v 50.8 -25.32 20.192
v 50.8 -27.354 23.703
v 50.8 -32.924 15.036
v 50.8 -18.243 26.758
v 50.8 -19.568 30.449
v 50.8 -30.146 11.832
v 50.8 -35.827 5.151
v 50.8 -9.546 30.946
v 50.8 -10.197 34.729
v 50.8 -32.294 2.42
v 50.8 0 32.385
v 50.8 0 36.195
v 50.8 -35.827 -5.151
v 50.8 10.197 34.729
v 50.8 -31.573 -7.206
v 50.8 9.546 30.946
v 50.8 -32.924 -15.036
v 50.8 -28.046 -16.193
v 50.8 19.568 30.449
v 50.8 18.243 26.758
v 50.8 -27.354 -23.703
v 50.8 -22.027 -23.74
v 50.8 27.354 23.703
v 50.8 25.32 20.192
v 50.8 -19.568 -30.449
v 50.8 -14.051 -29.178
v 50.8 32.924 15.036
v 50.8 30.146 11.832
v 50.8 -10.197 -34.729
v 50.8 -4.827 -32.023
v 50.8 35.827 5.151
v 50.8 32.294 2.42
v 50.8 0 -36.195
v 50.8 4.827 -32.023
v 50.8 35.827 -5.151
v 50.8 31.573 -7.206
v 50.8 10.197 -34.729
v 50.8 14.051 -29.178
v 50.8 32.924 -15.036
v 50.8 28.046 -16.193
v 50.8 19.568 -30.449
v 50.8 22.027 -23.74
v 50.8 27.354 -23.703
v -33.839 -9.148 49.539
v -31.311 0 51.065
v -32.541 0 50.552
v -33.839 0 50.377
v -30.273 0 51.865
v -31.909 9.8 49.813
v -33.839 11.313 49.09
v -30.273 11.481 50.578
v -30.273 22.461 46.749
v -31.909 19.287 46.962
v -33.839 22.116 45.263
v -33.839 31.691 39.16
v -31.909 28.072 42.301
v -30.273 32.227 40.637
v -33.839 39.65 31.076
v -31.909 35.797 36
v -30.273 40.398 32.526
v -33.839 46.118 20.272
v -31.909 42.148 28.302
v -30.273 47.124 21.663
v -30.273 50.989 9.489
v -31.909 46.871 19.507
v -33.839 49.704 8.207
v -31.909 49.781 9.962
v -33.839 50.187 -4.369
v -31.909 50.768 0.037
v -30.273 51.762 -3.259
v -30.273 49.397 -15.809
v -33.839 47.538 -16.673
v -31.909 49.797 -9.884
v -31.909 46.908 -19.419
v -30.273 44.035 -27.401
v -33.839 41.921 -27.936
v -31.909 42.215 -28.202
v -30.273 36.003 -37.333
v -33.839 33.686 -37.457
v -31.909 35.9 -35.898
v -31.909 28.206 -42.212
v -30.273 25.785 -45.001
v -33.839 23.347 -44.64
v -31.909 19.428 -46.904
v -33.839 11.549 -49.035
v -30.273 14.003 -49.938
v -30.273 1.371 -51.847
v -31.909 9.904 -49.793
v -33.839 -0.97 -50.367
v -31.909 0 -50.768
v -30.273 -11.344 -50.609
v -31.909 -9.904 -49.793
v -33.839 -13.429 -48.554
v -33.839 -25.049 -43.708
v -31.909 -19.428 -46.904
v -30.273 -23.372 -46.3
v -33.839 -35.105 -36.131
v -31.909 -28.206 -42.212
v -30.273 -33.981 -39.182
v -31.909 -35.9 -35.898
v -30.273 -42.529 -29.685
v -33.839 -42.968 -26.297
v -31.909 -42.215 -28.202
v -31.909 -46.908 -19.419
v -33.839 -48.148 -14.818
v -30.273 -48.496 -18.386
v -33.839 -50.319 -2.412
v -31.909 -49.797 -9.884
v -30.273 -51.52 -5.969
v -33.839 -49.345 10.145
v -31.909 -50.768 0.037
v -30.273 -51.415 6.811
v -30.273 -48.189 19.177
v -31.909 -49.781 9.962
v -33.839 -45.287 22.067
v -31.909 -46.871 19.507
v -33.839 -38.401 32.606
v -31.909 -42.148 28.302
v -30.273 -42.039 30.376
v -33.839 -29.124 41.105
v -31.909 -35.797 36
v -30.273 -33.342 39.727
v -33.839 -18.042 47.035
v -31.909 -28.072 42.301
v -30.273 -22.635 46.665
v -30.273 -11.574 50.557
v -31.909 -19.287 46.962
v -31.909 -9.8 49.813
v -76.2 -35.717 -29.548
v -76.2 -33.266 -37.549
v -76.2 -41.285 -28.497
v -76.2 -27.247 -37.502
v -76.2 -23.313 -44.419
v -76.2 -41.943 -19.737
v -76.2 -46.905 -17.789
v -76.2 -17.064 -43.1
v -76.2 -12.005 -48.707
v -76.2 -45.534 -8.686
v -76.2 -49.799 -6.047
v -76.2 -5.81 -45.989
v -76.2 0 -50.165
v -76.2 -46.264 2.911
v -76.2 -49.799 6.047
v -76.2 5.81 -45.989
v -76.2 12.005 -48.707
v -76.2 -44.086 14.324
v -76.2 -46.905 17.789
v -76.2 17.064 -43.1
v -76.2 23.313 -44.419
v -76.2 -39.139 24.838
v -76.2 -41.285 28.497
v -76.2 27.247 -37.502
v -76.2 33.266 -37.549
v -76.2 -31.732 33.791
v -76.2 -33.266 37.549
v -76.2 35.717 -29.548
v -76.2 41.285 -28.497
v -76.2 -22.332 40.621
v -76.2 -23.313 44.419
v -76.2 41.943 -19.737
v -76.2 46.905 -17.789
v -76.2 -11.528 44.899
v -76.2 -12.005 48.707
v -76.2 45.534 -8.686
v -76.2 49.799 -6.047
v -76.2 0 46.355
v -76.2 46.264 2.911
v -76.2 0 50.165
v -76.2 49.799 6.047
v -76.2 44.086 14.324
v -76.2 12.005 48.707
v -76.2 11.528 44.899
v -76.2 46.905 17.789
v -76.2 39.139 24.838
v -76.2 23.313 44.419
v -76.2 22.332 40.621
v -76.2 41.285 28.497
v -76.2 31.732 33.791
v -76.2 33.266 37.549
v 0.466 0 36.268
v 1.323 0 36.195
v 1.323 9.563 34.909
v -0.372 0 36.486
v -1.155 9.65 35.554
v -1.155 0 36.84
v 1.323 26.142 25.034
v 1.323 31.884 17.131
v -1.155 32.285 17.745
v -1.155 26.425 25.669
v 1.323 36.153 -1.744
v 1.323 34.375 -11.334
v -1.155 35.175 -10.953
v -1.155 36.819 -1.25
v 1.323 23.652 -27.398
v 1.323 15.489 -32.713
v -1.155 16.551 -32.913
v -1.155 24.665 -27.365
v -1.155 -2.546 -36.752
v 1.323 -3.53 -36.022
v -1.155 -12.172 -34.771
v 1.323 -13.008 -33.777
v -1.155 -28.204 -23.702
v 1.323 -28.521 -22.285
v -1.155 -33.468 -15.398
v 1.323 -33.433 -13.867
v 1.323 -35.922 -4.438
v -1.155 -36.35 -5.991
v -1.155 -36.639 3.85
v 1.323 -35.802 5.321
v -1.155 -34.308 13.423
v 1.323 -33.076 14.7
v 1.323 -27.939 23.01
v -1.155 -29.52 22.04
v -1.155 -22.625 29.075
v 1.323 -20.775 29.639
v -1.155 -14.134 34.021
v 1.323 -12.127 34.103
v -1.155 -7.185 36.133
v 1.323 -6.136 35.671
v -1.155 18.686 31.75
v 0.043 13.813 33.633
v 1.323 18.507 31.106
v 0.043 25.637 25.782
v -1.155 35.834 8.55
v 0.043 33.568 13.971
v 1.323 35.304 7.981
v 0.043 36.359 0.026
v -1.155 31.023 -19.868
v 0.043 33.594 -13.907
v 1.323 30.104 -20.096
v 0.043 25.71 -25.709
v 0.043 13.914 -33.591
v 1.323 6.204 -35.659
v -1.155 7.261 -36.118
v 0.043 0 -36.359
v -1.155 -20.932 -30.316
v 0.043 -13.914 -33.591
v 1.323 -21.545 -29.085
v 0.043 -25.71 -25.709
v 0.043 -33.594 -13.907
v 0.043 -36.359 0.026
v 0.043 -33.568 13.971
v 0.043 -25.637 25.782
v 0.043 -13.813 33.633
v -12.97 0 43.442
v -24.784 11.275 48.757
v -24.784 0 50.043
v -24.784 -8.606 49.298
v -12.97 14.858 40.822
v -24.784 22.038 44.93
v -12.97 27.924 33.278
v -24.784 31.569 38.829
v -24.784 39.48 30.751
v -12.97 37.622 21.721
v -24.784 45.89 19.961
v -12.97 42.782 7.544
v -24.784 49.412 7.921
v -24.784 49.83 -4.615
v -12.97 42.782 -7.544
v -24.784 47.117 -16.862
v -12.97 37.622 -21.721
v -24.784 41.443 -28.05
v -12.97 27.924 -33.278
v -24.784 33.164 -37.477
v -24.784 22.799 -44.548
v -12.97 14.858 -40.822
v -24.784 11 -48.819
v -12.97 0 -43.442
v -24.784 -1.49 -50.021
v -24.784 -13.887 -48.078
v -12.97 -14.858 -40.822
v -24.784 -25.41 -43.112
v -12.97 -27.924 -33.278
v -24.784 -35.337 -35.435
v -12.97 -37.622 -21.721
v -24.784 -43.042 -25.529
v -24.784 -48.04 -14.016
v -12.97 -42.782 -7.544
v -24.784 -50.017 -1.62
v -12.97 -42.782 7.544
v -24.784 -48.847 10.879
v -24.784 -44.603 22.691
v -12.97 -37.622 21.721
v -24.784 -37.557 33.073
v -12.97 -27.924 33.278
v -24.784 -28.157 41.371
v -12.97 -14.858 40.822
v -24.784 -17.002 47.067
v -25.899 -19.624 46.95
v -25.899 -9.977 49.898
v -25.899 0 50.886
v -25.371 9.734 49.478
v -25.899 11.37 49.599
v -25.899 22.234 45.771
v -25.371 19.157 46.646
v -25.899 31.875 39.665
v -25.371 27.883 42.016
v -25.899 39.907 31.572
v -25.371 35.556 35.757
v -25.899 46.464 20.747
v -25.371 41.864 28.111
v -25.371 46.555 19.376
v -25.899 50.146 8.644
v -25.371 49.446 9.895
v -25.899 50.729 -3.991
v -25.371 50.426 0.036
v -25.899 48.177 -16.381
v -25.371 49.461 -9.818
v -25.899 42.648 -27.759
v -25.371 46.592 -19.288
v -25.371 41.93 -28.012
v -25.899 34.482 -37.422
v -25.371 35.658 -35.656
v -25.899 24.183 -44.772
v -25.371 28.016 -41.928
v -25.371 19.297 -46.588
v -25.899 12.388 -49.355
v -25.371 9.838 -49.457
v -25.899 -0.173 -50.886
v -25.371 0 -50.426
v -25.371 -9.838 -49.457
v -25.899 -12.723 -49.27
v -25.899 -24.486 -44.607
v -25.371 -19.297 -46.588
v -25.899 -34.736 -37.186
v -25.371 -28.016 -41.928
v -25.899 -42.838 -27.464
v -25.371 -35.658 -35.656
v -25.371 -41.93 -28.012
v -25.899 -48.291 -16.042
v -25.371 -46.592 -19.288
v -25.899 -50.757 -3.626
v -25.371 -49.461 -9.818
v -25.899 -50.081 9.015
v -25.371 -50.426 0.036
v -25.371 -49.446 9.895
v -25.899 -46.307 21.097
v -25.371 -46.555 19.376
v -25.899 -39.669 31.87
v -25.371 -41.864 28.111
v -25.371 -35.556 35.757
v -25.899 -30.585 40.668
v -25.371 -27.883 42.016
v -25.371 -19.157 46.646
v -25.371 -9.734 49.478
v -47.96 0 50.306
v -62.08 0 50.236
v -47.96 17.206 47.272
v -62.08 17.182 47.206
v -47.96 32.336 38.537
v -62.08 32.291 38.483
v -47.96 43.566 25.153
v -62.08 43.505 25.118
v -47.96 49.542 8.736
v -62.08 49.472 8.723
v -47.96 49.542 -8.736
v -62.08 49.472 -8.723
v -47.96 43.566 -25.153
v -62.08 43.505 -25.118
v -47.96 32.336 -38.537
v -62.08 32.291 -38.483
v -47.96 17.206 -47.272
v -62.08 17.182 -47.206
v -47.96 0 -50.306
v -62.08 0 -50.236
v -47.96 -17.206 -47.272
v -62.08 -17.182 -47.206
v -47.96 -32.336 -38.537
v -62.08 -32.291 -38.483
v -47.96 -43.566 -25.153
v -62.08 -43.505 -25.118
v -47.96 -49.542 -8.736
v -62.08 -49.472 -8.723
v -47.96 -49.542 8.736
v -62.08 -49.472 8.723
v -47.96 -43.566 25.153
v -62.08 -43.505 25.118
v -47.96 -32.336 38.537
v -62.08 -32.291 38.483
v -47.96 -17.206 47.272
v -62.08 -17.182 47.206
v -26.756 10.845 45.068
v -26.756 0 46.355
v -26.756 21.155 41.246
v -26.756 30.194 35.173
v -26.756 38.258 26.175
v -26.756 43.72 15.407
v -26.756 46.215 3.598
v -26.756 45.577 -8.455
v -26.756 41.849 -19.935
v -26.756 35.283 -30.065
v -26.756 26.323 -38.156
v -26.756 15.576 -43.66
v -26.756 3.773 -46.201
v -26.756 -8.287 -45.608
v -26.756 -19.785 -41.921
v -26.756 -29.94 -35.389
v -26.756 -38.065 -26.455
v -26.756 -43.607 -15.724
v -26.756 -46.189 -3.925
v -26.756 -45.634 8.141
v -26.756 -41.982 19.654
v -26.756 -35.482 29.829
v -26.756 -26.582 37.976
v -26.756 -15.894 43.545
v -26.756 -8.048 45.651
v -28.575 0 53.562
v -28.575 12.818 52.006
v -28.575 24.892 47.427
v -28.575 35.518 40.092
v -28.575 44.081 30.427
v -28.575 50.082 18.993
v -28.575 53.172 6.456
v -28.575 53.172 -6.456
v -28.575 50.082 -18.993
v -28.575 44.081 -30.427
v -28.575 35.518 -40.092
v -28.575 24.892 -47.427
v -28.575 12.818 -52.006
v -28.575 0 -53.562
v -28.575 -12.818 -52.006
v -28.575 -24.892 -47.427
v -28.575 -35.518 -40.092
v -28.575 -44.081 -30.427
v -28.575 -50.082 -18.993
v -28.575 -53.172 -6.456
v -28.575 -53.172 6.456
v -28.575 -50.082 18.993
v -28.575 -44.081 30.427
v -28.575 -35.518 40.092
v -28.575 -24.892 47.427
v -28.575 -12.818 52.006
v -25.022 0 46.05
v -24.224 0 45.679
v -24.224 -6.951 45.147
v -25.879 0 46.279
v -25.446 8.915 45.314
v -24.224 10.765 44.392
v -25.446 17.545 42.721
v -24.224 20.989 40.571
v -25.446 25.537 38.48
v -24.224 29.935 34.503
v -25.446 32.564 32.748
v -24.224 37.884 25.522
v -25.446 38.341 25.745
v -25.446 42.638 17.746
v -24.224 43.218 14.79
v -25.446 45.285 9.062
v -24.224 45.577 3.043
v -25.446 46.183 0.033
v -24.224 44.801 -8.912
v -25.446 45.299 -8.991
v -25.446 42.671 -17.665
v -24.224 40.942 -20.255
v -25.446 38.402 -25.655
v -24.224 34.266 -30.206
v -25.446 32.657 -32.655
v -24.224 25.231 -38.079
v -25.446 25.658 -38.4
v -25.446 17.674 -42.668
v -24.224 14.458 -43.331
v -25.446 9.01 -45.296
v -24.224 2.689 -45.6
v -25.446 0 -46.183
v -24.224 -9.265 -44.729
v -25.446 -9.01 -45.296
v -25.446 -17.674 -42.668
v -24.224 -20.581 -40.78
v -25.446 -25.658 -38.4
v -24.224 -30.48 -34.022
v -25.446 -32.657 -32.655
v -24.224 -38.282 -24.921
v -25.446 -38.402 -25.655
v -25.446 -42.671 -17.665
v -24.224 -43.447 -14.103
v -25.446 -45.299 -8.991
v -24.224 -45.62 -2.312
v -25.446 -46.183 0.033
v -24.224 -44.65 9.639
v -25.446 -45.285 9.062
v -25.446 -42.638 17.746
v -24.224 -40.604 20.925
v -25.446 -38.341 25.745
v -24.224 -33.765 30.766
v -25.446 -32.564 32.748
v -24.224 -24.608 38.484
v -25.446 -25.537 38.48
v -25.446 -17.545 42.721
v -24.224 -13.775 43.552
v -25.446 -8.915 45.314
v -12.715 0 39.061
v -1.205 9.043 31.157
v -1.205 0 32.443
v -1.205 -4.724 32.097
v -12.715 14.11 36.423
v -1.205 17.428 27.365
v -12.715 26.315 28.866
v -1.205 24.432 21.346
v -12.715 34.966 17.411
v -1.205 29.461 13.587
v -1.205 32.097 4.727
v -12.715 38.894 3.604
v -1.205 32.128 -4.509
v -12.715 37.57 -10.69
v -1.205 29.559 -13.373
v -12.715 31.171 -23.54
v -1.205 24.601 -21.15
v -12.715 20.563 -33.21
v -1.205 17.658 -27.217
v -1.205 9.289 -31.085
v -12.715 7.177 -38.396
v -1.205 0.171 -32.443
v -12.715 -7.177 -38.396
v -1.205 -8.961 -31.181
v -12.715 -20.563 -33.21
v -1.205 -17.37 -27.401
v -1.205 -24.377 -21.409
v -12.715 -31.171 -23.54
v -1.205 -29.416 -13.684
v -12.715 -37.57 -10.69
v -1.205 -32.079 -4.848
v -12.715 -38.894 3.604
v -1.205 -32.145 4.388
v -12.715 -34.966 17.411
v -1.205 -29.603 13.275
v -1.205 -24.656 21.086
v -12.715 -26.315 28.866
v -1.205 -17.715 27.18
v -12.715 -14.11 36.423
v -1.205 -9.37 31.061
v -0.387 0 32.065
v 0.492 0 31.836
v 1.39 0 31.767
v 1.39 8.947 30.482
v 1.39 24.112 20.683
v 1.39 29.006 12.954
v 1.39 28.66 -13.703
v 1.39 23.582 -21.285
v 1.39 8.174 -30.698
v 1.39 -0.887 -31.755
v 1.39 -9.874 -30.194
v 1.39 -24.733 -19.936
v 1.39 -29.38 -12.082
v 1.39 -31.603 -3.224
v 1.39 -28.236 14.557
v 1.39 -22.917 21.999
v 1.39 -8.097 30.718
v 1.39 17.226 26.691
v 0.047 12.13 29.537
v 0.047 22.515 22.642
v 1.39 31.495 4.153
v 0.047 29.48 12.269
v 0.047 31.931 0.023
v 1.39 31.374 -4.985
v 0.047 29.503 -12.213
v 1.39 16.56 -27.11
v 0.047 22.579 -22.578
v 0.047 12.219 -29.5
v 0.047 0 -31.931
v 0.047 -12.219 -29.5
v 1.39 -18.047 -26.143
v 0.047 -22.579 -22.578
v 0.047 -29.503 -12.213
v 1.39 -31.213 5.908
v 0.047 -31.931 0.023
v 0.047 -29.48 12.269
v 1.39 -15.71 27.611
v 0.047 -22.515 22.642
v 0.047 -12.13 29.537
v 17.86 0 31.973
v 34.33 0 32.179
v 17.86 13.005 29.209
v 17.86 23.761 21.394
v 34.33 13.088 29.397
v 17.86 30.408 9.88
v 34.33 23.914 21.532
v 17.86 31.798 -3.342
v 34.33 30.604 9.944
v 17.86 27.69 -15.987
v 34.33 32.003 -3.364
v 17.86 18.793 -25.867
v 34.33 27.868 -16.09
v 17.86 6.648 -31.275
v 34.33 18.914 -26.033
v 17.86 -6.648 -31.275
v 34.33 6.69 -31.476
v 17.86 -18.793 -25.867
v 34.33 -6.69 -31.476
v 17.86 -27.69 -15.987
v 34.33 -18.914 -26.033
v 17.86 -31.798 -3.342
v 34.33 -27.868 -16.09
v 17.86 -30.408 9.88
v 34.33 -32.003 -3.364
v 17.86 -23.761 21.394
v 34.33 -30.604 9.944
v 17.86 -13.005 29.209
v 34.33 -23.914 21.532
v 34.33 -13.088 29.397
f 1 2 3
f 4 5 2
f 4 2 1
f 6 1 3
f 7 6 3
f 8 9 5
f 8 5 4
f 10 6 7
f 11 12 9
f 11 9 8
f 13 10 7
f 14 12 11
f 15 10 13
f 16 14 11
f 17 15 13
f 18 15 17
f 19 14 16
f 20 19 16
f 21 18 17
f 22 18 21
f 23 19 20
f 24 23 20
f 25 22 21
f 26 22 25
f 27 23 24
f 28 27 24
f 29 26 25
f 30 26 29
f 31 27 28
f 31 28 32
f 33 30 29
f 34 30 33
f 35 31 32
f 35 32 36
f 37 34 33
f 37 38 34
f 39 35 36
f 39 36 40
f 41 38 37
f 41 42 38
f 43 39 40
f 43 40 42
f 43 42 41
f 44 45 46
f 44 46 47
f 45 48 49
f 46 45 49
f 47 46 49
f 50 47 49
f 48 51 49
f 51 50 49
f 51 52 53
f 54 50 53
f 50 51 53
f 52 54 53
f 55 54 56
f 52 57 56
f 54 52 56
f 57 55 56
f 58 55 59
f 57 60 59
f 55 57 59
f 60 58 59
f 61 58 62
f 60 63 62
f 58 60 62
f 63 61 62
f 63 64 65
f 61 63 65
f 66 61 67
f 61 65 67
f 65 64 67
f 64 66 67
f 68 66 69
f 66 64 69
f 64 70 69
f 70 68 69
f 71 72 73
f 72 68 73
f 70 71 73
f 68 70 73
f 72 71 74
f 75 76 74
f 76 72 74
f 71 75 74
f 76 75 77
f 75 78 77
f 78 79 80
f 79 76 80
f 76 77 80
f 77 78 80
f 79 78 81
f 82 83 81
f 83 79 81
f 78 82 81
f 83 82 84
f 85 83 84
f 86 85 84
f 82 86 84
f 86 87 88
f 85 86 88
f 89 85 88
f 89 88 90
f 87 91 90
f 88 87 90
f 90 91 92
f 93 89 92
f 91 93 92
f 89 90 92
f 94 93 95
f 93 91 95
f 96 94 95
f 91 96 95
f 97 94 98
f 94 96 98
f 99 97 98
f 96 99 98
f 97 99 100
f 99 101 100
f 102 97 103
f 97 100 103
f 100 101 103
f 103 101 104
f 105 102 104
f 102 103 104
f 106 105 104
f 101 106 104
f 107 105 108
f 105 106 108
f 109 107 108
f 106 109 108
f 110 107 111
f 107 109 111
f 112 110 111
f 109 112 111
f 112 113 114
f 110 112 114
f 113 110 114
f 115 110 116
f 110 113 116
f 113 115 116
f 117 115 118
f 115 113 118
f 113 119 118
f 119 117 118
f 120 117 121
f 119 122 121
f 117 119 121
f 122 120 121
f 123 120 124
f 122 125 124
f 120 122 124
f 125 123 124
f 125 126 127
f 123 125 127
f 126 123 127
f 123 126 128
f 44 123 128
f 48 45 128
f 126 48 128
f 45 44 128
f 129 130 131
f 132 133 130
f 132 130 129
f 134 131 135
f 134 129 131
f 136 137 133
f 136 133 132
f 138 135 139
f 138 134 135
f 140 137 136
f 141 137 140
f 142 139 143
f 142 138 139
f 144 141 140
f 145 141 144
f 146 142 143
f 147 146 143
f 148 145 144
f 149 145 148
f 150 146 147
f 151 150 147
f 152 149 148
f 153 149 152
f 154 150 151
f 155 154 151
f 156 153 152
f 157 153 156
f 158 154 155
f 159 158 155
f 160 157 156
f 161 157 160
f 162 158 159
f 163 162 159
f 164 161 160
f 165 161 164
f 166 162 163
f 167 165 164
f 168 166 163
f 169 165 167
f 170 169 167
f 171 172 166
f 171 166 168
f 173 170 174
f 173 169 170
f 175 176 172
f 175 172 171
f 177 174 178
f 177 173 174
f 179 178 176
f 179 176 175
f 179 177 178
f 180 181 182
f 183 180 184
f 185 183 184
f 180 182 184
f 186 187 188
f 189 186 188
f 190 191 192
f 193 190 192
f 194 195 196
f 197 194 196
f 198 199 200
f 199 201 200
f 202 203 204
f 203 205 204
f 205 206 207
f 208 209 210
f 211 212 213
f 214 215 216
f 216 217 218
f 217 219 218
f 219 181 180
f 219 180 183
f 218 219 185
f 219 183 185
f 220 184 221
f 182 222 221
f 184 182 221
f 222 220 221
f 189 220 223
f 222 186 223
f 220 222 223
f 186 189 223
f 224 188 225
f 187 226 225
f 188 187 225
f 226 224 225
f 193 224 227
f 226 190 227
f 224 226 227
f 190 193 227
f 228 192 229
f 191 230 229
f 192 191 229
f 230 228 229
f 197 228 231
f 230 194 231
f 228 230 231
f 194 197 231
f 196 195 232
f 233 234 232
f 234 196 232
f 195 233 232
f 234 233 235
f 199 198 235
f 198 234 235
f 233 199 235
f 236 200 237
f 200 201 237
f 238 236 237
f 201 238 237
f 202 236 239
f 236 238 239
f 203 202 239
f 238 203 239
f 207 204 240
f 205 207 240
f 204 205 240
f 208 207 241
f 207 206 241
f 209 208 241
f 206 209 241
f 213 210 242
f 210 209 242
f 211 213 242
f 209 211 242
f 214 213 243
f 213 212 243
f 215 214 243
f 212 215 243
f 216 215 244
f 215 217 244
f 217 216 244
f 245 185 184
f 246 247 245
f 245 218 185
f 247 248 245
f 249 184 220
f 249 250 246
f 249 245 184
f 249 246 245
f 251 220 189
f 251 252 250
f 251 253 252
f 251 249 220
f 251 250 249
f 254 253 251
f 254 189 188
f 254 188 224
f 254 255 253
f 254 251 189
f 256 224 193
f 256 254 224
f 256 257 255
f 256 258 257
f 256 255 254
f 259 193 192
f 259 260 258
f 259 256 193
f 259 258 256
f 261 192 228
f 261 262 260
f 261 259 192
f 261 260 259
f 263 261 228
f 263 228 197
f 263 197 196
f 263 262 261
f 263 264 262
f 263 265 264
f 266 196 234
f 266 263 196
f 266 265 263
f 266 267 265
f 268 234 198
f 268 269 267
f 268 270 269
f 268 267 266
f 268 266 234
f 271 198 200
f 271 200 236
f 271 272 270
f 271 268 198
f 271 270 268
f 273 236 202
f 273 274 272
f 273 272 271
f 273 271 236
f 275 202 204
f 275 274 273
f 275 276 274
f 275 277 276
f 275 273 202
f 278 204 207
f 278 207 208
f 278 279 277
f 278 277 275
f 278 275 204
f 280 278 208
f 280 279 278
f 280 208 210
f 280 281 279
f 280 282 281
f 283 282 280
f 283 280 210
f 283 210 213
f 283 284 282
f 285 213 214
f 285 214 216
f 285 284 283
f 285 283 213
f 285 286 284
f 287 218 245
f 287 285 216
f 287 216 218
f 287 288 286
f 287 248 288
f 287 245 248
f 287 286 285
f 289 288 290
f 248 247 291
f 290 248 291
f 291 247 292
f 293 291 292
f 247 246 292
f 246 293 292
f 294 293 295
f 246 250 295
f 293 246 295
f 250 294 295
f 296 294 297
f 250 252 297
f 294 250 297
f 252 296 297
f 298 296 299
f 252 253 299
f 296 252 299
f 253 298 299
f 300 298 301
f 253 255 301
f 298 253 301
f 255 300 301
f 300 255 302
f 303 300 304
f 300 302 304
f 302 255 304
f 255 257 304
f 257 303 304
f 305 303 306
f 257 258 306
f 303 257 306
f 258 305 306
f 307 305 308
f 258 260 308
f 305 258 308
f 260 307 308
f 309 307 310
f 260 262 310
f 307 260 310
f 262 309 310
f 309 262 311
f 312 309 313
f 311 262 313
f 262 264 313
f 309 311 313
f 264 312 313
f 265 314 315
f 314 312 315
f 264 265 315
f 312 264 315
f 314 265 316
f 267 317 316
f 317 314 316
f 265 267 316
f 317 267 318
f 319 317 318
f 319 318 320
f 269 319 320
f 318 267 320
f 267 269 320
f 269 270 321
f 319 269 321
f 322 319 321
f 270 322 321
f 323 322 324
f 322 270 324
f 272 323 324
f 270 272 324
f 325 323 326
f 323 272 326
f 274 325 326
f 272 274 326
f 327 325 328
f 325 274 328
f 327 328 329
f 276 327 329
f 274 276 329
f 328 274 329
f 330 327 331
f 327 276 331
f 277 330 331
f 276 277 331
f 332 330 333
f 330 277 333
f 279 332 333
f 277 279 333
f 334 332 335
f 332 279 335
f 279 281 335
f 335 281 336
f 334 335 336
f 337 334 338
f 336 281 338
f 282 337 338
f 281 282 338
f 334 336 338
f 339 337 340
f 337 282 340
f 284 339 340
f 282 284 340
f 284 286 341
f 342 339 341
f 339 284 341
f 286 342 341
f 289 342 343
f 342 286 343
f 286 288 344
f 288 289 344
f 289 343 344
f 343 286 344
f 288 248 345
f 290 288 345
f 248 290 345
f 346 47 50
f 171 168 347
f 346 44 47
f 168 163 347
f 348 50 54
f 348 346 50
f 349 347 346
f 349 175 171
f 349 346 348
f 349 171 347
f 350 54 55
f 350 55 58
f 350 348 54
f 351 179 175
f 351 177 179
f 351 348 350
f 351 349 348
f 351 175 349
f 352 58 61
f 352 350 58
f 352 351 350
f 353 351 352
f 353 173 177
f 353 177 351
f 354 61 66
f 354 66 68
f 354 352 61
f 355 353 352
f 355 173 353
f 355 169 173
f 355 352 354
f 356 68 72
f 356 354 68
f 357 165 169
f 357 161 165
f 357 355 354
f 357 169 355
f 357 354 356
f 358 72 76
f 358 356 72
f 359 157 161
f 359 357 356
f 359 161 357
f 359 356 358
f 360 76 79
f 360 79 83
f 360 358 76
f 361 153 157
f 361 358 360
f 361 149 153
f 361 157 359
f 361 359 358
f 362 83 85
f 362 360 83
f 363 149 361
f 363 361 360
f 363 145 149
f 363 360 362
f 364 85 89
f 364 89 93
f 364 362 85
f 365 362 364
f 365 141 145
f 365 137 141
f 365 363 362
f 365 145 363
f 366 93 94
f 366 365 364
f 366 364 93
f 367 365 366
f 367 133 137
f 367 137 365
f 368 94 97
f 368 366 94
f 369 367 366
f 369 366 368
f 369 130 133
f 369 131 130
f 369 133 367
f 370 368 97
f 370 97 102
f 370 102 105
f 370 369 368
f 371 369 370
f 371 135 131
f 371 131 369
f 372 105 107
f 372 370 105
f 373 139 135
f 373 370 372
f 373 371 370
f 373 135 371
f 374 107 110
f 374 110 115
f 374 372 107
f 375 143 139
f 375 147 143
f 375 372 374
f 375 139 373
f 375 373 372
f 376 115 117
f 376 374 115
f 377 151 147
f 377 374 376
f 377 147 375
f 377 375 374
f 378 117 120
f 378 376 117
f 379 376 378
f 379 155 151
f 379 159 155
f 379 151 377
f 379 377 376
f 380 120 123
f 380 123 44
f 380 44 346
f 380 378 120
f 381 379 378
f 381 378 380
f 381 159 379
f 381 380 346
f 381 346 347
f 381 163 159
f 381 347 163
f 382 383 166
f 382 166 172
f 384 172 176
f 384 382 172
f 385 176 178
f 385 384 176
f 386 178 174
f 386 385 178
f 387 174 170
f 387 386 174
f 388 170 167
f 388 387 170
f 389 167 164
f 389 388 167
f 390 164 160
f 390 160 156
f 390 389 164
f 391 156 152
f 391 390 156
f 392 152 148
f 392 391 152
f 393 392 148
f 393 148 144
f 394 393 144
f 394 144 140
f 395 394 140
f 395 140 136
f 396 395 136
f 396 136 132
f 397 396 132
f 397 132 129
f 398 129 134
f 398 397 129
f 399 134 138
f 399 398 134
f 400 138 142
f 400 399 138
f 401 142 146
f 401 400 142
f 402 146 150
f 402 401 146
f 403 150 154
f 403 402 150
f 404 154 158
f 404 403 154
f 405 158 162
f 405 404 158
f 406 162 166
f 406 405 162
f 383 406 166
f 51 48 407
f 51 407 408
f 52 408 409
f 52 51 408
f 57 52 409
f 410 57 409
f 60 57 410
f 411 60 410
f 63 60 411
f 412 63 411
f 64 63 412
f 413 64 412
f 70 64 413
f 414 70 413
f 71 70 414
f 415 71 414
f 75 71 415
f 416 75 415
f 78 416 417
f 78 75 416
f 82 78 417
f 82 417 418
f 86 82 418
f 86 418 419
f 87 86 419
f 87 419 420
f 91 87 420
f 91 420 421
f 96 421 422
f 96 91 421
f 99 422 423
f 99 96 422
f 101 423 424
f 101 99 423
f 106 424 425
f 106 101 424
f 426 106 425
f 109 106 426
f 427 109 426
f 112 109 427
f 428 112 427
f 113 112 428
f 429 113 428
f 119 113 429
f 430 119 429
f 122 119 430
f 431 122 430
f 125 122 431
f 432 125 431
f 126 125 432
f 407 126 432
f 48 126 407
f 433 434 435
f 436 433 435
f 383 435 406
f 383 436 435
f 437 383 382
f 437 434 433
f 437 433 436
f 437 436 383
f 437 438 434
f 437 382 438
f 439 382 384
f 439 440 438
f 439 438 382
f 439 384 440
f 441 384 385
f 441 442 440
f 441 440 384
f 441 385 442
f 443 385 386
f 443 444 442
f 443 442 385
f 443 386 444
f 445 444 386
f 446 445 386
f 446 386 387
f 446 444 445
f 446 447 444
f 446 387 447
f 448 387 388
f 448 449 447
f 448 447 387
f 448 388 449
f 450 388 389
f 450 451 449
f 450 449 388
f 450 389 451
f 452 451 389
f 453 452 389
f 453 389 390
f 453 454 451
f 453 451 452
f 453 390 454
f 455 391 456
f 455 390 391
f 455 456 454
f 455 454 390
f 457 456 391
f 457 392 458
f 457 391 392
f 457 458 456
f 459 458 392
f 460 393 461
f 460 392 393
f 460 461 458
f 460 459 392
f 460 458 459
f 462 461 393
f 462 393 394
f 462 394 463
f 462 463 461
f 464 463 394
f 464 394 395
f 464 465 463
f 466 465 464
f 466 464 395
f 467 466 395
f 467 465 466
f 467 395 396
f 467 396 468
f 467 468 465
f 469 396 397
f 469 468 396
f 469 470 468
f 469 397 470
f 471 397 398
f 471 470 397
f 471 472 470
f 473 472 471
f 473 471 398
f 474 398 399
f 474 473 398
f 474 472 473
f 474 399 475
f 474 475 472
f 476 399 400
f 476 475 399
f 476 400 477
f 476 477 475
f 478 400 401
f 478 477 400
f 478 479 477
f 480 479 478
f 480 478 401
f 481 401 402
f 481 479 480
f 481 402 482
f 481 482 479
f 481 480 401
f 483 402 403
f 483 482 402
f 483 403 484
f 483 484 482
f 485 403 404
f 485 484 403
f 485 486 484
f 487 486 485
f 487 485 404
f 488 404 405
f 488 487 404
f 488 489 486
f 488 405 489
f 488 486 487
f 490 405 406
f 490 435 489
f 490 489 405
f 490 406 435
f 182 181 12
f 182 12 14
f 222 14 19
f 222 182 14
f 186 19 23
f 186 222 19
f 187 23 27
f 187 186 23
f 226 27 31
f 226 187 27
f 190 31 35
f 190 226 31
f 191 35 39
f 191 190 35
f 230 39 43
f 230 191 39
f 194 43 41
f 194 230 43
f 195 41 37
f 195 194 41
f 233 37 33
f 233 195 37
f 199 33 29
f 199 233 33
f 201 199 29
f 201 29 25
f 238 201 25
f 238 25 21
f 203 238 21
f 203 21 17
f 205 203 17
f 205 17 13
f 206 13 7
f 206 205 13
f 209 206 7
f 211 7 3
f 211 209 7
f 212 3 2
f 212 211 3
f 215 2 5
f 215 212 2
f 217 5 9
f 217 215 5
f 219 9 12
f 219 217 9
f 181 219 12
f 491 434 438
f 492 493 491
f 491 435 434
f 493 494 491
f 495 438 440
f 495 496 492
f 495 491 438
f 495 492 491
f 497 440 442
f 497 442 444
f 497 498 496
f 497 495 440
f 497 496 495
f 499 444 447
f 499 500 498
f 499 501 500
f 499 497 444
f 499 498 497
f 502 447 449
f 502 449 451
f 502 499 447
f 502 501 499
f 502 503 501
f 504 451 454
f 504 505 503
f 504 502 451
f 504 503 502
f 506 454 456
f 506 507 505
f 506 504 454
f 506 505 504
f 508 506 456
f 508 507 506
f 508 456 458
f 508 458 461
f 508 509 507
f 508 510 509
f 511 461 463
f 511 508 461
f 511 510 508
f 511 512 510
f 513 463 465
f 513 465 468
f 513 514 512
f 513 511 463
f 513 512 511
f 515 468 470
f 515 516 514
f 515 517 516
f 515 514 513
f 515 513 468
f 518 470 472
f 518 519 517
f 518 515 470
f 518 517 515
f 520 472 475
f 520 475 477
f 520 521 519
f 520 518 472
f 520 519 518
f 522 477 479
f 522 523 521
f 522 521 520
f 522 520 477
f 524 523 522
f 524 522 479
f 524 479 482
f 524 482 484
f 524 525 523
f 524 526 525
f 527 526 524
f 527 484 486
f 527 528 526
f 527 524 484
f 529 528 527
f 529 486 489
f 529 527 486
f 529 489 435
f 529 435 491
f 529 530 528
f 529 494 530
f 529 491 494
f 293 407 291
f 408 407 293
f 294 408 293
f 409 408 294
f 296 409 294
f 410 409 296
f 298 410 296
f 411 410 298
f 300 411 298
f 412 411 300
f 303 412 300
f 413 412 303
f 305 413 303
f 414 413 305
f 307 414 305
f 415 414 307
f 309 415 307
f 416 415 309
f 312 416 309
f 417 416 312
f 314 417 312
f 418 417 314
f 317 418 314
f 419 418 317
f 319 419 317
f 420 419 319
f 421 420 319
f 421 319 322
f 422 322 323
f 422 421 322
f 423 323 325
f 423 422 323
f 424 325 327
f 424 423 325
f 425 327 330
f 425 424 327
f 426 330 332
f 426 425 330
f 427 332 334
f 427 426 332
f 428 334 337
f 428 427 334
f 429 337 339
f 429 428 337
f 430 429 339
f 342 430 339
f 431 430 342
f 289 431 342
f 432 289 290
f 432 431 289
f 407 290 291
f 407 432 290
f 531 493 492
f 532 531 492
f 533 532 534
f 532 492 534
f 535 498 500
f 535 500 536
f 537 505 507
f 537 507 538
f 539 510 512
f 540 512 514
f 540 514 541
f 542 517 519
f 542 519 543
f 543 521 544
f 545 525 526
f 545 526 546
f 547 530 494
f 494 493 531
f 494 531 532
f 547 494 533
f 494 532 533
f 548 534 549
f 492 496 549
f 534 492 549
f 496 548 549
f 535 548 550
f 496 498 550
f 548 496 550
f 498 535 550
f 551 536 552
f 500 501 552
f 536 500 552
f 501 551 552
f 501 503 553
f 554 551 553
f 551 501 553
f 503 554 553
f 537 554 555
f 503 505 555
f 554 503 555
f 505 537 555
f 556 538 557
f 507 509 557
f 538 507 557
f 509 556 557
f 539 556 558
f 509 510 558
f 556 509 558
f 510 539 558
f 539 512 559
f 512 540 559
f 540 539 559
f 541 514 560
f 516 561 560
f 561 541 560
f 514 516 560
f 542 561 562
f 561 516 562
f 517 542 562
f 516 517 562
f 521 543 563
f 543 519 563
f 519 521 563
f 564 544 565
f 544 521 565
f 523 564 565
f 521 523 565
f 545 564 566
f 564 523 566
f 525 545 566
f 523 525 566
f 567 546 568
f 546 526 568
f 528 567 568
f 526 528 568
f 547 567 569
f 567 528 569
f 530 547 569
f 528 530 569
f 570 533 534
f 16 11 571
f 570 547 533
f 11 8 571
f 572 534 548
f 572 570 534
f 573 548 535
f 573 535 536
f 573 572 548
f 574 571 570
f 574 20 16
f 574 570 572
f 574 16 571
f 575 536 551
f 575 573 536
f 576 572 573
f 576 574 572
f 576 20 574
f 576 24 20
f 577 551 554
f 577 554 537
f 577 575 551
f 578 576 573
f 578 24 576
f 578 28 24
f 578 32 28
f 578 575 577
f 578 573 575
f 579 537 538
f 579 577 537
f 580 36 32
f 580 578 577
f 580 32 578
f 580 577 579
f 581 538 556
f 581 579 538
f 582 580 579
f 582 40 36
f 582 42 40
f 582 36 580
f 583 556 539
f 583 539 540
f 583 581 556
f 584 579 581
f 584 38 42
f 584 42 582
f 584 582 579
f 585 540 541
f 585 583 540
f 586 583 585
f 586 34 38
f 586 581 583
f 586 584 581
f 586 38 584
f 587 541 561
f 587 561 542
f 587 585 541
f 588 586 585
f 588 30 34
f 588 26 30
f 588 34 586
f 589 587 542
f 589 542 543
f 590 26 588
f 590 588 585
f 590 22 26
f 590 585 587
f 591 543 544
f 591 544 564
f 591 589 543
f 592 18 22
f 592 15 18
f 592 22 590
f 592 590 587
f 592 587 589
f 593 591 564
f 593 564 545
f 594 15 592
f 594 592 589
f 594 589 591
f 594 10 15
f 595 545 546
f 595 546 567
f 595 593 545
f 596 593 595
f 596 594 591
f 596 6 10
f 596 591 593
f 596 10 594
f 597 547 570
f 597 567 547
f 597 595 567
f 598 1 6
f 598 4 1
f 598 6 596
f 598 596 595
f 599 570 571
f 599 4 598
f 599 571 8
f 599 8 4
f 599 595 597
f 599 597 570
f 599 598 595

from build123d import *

# Parameters (mm, degrees)
F3_R = 5.08


# Not quite as in the source:
# - a variable given as a bare number and used for a length is read in inches; the dataset says mm whatever the document's units were


with BuildPart() as f2:
    # F1 (on Front) → F2 (revolve)
    with BuildSketch(Plane.XZ):
        Polygon((-25.4, 46.355), (0, 31.75), (50.8, 32.385), (50.8, 36.195), (0, 36.195), (-25.4, 50.38725), (-28.575, 53.56225), (-31.75, 50.38725), (-76.2, 50.165), (-76.2, 46.355), align=None)
    revolve(axis=Axis((-24.3991323134, 0, 0), (-1, 0, 0)))

    # F3
    f3_edges = [f2.edges().sort_by_distance(p)[0] for p in [
        (-25.4, 0, -46.355),
        (0, 0, -31.75),
        (0, 0, -36.195),
        (-31.75, 0, -50.38725),
        (-25.4, 0, -50.38725),
    ]]
    fillet(f3_edges, radius=F3_R)


solid = f2.part
